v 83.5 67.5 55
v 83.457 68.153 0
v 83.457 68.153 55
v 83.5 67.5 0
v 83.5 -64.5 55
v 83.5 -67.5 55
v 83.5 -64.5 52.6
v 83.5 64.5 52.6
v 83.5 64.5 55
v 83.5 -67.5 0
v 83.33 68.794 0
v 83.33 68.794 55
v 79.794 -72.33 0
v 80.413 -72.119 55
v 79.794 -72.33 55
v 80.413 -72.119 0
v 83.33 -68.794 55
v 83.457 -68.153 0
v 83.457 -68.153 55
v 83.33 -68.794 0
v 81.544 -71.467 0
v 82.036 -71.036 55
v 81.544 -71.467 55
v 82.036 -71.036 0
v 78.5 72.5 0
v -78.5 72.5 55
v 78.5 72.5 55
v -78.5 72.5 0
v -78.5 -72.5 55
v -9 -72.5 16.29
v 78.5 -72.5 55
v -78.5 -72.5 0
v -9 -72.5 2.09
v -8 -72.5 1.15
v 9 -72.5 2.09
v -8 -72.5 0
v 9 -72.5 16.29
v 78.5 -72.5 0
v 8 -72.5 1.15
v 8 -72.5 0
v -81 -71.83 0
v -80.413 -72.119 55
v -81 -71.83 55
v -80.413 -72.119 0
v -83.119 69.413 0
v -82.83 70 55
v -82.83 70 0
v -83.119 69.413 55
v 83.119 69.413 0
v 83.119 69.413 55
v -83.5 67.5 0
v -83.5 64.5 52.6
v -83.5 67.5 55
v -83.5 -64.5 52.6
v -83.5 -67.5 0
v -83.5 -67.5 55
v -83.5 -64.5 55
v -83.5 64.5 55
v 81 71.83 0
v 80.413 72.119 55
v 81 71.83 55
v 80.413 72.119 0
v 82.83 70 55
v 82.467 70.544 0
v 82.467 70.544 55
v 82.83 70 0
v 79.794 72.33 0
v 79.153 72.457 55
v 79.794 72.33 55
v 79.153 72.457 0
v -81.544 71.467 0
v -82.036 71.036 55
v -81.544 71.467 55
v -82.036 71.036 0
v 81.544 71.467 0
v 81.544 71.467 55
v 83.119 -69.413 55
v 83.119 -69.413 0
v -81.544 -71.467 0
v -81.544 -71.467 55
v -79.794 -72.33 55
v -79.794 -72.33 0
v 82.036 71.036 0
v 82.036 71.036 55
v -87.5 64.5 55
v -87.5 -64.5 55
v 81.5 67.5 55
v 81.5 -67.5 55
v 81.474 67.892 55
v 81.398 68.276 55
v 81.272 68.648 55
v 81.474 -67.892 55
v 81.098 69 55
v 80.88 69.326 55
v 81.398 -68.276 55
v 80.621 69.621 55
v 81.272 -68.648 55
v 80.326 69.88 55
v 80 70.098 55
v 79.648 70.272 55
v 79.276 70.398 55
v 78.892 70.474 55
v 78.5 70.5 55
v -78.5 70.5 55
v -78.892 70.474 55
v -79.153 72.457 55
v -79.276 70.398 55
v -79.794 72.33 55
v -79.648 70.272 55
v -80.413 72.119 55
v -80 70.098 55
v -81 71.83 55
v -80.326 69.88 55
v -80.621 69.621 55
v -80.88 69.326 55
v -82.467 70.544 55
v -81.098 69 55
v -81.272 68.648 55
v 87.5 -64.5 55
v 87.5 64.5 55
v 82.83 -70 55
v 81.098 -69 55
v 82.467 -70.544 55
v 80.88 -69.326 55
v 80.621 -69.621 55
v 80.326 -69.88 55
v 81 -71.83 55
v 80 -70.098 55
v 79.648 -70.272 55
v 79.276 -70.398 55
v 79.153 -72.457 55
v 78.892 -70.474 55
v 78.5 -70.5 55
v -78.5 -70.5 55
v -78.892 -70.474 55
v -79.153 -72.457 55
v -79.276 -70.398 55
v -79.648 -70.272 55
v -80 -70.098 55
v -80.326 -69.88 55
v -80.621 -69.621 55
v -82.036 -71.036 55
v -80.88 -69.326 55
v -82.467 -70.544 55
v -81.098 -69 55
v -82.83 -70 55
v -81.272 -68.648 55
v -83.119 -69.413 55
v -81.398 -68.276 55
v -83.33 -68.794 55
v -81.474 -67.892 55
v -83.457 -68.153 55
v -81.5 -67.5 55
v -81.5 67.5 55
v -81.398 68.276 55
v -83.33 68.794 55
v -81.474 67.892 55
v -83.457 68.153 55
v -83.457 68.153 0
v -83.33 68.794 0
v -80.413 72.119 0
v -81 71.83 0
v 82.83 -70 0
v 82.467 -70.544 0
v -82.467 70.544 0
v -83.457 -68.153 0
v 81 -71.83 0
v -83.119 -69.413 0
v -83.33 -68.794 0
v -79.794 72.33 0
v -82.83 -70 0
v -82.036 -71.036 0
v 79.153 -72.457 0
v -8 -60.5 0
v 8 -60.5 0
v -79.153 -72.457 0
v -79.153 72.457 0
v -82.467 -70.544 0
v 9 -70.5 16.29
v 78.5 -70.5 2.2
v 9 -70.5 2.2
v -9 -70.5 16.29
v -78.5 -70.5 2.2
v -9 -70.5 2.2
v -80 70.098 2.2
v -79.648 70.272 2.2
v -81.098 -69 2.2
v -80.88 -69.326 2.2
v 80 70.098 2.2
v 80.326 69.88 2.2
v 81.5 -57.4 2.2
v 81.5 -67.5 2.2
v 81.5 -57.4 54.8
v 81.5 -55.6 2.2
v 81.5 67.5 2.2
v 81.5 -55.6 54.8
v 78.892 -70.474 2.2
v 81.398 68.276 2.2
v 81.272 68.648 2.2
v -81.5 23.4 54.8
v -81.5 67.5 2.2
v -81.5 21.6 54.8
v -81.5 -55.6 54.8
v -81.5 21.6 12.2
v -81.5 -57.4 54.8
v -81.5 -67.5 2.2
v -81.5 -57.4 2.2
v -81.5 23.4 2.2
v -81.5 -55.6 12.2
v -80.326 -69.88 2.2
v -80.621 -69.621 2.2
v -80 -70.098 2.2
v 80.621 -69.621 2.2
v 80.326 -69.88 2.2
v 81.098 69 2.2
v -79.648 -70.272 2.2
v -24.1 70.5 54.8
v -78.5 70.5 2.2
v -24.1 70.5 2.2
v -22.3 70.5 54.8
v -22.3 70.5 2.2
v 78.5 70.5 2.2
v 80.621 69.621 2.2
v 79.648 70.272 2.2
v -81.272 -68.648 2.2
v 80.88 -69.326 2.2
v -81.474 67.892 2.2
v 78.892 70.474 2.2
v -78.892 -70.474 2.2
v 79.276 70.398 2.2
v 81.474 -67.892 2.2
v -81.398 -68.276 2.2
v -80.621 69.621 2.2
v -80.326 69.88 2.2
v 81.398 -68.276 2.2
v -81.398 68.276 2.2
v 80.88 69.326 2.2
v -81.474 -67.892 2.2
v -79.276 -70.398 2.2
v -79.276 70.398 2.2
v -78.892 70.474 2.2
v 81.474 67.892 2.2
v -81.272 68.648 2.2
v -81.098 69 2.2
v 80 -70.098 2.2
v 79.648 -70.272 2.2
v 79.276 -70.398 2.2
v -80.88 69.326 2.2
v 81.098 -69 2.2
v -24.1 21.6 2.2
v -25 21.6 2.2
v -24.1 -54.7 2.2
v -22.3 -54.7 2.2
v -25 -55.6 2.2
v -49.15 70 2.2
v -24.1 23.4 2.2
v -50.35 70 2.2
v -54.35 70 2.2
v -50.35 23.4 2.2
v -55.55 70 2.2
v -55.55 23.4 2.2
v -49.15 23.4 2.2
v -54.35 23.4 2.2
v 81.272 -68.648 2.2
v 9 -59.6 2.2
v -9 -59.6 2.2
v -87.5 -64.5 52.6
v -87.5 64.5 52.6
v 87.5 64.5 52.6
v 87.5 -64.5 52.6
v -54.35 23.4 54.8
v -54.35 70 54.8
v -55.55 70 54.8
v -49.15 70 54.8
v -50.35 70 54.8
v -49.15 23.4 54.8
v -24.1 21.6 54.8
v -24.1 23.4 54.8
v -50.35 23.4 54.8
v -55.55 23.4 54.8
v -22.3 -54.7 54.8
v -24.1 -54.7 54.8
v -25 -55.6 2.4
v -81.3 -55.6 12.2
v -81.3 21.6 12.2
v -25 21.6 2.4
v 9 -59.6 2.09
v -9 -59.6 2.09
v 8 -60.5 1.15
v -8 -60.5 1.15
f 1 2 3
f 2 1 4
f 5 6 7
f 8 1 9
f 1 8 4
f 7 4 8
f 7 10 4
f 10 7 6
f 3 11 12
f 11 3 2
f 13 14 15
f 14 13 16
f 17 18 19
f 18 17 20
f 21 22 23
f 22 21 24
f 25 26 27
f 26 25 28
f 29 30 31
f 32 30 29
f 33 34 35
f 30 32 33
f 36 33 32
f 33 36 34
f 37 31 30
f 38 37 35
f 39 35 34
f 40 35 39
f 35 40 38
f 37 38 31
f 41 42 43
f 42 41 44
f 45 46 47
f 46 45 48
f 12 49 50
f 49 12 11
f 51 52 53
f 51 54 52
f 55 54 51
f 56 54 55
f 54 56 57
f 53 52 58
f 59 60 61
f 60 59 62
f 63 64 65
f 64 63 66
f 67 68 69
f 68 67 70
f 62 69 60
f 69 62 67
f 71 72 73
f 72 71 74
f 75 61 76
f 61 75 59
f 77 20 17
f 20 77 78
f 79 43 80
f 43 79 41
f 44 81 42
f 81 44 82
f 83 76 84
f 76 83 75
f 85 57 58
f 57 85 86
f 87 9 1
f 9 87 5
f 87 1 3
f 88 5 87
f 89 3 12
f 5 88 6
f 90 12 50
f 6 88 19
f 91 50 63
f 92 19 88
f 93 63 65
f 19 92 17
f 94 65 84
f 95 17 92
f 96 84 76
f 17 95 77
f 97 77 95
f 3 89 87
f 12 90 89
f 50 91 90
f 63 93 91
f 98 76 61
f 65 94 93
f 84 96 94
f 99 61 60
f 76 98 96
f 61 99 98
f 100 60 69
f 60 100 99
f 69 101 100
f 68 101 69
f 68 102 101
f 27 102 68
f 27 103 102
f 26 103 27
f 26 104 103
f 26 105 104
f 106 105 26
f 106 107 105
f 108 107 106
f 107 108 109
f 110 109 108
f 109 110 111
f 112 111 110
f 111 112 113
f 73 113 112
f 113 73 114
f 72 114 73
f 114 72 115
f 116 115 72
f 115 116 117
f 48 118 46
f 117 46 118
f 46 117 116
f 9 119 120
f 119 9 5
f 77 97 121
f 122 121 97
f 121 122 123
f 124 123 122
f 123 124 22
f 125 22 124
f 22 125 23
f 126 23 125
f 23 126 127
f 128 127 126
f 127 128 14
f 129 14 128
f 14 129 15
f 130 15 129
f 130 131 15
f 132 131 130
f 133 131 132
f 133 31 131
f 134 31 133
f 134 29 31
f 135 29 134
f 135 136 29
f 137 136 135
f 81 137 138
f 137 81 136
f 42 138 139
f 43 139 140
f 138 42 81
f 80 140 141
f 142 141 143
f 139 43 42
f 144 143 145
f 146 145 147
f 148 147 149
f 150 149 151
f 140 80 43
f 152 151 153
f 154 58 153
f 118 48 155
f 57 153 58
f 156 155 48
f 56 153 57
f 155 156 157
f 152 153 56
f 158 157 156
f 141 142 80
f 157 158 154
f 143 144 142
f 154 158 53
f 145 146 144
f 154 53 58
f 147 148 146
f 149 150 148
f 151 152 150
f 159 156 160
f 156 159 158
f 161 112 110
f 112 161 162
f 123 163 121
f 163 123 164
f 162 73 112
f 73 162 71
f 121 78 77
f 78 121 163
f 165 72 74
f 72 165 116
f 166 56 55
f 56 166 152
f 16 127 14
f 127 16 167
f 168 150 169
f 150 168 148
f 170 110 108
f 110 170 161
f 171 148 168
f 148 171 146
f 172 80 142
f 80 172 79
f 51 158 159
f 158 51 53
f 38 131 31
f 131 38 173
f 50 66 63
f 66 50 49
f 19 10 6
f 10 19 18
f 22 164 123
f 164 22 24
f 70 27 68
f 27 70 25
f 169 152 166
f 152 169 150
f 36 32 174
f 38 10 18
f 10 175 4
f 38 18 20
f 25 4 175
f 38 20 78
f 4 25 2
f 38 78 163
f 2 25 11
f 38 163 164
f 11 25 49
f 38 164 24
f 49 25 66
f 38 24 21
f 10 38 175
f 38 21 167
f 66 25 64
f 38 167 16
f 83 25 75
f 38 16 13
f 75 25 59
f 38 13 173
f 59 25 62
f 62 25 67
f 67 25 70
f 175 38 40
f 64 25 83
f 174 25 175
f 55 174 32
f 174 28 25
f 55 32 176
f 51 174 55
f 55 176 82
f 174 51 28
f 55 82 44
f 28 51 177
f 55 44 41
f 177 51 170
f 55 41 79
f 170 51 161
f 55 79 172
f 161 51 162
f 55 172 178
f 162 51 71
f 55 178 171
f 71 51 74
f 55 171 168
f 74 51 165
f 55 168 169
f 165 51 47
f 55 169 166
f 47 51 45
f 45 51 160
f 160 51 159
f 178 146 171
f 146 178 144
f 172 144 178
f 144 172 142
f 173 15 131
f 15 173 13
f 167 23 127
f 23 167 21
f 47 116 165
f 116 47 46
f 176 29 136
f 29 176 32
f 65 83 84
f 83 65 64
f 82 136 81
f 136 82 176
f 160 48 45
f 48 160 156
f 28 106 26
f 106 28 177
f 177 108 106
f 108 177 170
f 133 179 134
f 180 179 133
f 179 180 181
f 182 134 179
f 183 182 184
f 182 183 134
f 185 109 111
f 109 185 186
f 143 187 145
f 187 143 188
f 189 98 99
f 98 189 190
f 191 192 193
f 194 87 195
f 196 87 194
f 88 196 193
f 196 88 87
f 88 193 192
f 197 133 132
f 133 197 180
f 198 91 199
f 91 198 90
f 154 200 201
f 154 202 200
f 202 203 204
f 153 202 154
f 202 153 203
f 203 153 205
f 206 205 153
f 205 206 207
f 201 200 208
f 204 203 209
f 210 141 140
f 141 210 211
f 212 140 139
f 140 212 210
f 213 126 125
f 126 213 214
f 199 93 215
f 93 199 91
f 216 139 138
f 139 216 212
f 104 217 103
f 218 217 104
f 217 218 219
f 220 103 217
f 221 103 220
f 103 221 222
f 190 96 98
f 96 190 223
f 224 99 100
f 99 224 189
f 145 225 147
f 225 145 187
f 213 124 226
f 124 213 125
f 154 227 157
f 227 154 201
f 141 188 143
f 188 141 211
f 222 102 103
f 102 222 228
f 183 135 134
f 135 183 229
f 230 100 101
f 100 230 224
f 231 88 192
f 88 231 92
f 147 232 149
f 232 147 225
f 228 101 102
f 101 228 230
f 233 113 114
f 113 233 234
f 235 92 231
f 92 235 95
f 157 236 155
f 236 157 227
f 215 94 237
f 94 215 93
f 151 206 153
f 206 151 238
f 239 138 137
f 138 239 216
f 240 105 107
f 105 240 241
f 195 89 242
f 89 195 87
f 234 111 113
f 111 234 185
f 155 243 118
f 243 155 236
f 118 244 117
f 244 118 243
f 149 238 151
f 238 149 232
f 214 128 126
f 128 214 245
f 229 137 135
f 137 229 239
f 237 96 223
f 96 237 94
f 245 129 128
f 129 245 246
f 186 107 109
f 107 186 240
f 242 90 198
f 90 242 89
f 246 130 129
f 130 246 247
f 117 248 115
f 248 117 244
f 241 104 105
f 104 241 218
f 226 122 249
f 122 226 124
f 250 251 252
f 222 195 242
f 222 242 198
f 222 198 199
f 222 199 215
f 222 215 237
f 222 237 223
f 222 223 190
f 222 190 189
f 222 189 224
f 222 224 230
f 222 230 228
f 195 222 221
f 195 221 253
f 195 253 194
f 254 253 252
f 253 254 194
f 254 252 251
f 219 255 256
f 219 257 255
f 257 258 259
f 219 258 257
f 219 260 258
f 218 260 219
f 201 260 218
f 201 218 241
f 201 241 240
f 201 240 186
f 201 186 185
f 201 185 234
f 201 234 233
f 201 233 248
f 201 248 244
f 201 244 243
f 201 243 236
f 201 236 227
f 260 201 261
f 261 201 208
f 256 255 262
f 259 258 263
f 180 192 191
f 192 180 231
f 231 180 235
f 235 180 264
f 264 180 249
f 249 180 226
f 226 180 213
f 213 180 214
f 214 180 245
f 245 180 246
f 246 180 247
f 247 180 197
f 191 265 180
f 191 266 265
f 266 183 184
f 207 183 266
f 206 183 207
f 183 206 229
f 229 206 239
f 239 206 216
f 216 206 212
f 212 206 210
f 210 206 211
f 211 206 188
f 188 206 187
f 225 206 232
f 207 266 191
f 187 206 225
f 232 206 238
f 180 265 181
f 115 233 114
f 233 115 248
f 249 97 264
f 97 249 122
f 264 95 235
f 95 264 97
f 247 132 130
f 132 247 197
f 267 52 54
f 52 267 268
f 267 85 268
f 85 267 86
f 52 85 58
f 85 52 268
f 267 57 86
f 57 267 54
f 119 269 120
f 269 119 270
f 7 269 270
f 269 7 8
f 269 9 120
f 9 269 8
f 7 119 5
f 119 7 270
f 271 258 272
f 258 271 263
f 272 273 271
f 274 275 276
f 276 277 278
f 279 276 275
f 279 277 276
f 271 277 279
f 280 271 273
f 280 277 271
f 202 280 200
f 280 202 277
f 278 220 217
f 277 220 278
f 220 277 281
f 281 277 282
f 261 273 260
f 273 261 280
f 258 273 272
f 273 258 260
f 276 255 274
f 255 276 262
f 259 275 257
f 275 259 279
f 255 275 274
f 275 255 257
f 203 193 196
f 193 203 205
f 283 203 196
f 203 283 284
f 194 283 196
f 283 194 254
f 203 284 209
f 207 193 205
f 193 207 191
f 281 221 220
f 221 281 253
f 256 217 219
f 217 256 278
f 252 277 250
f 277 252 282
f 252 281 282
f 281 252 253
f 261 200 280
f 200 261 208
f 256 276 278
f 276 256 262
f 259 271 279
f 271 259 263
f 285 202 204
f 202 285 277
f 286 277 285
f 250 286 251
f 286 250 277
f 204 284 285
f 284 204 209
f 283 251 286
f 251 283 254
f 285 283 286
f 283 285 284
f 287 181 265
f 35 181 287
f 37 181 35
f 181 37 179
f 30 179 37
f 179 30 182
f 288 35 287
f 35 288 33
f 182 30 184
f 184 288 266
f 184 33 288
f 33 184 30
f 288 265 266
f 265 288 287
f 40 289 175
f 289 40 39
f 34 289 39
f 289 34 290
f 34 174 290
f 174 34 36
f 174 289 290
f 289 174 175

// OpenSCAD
// Tesla Model Y (2020–2024) — Gen‑2 front centre console sliding-lid organizer
// Holds: credit/e-charge cards · coins · pens · sunglasses
//
// Fit basis (aftermarket Gen‑2 trays): ~165 × 130 × 60 mm.
// Slightly longer (145 mm) so pockets stay reachable under the lid.
// Measure your console and tweak the parameters below before printing.
//
// Print: PETG or ABS/ASA (cabin heat). 0.2 mm layers, 3–4 perimeters, 20–40% infill.
// Orientation: print open-side up. No supports needed.

/* [Fit — measure and adjust] */
overall_w = 167;   // left–right (mm). Start 165–169.
overall_l = 145;   // front–back (mm)
overall_h = 55;    // tray height (mm) — leave lid clearance
wall = 2.0;
floor_t = 2.2;
corner_r = 5.0;

/* [Rail lips] */
lip_overhang = 4.0;
lip_thickness = 2.4;
lip_inset_from_ends = 8.0;

/* [Pockets — sized for real items] */
// ISO credit card ≈ 85.6 × 54.0 × 0.76 mm
card_slot_clearance = 2.5;     // extra width for 2–3 cards + finger
card_slot_w = 54.0 + card_slot_clearance;  // cards stand on long edge
card_slot_gap = 4.0;           // throat for stacked cards
card_pocket_depth = 48;        // how far cards sit into the tray (Y)

// Coin well — euros / mixed change
coin_well_w = 44;
coin_well_d = 44;
coin_ramp_rise = 10;           // floor rises this much — coins slide to the low edge

// Pen trough — typical pen ~140 × Ø10 mm (along tray width)
pen_trough_w = 14;
pen_trough_clearance = 2;

// Sunglasses bay uses remaining space (folded frames ~140 × 55–65 mm)

divider = 1.8;
cable_notch_w = 18;
cable_notch_d = 12;
cable_notch_h = 14;

/* [Quality] */
$fn = 48;

function left_col_w() = max(card_slot_w, coin_well_w) + divider;

module rounded_rect(size, r) {
    x = size[0]; y = size[1]; z = size[2];
    r2 = min(r, x/2 - 0.01, y/2 - 0.01);
    hull() {
        for (sx = [-1, 1], sy = [-1, 1])
            translate([sx * (x/2 - r2), sy * (y/2 - r2), 0])
                cylinder(h = z, r = r2);
    }
}

module shell() {
    union() {
        difference() {
            rounded_rect([overall_w, overall_l, overall_h], corner_r);
            translate([0, 0, floor_t])
                rounded_rect([
                    overall_w - 2*wall,
                    overall_l - 2*wall,
                    overall_h
                ], max(0.5, corner_r - wall));
        }
        for (sx = [-1, 1]) {
            translate([
                sx * (overall_w/2 + lip_overhang/2),
                0,
                overall_h - lip_thickness/2
            ])
                cube([
                    lip_overhang,
                    max(10, overall_l - 2*lip_inset_from_ends),
                    lip_thickness
                ], center = true);
        }
    }
}

// Layout (top view, +Y toward screen / wireless pad, −Y toward cup holders):
//
//  +Y (screen)
//  ┌──────────┬─────────────────────────┐
//  │  cards   │                         │
//  │  (slot)  │      sunglasses         │
//  ├──────────┤                         │
//  │  coins   │                         │
//  │  (ramp)  │                         │
//  ├──────────┴─────────────────────────┤
//  │           pens (full width)        │
//  └────────────────────────────────────┘
//  −Y (cup holders / USB)

module dividers() {
    inner_w = overall_w - 2*wall;
    inner_l = overall_l - 2*wall;
    h = overall_h - floor_t - 0.2;
    lc = left_col_w();

    // Pen trough along the cup-holder end (−Y), full inner width
    translate([0, -overall_l/2 + wall + pen_trough_w, floor_t + h/2])
        cube([inner_w, divider, h], center = true);

    // Vertical wall: left column (cards+coins) vs sunglasses bay
    left_wall_len = inner_l - pen_trough_w - divider;
    left_wall_y = overall_l/2 - wall - left_wall_len/2;
    translate([-overall_w/2 + wall + lc, left_wall_y, floor_t + h/2])
        cube([divider, left_wall_len, h], center = true);

    // Split cards (toward +Y) from coins (toward pens)
    split_y = overall_l/2 - wall - card_pocket_depth;
    translate([
        -overall_w/2 + wall + lc/2,
        split_y,
        floor_t + h/2
    ])
        cube([lc, divider, h], center = true);

    // Thin throat walls for the card slot
    card_centre_x = -overall_w/2 + wall + lc/2;
    card_centre_y = overall_l/2 - wall - card_pocket_depth/2;
    throat_wall = 1.2;
    half_gap = card_slot_gap / 2;
    for (sx = [-1, 1]) {
        translate([
            card_centre_x + sx * (half_gap + throat_wall/2),
            card_centre_y,
            floor_t + h/2
        ])
            cube([throat_wall, card_pocket_depth - 1, h], center = true);
    }
}

// Sloping coin floor: high at the outer (−X) wall, low at the sunglasses
// divider — coins pool at the low edge so you can pinch them easily.
module coin_ramp() {
    lc = left_col_w();
    well_w = lc - divider;                          // clear width inside left column
    split_y = overall_l/2 - wall - card_pocket_depth;
    y_hi = split_y - divider/2;                     // under card split
    y_lo = -overall_l/2 + wall + pen_trough_w + divider/2;
    well_d = y_hi - y_lo;
    rise = coin_ramp_rise;

    // Origin at outer-left corner of the coin pocket, on top of the floor
    x0 = -overall_w/2 + wall;
    y0 = y_lo;

    // Hull a tall thin slab on the outer wall down to a flat sliver on the inner edge
    translate([x0, y0, floor_t])
        hull() {
            // High edge (outer wall, −X)
            cube([0.2, well_d, rise]);
            // Low edge (toward sunglasses / +X) — almost flush with floor
            translate([well_w - 0.2, 0, 0])
                cube([0.2, well_d, 0.2]);
        }
}

module cable_notch() {
    translate([0, -overall_l/2 + cable_notch_d/2 - 0.1, floor_t + cable_notch_h/2 - 0.01])
        cube([cable_notch_w, cable_notch_d + wall, cable_notch_h + 0.2], center = true);
    translate([0, -overall_l/2 + cable_notch_d/2, -0.1])
        cube([cable_notch_w - 2, cable_notch_d, floor_t + 0.3], center = true);
}

difference() {
    union() {
        shell();
        dividers();
        coin_ramp();
    }
    cable_notch();
}
